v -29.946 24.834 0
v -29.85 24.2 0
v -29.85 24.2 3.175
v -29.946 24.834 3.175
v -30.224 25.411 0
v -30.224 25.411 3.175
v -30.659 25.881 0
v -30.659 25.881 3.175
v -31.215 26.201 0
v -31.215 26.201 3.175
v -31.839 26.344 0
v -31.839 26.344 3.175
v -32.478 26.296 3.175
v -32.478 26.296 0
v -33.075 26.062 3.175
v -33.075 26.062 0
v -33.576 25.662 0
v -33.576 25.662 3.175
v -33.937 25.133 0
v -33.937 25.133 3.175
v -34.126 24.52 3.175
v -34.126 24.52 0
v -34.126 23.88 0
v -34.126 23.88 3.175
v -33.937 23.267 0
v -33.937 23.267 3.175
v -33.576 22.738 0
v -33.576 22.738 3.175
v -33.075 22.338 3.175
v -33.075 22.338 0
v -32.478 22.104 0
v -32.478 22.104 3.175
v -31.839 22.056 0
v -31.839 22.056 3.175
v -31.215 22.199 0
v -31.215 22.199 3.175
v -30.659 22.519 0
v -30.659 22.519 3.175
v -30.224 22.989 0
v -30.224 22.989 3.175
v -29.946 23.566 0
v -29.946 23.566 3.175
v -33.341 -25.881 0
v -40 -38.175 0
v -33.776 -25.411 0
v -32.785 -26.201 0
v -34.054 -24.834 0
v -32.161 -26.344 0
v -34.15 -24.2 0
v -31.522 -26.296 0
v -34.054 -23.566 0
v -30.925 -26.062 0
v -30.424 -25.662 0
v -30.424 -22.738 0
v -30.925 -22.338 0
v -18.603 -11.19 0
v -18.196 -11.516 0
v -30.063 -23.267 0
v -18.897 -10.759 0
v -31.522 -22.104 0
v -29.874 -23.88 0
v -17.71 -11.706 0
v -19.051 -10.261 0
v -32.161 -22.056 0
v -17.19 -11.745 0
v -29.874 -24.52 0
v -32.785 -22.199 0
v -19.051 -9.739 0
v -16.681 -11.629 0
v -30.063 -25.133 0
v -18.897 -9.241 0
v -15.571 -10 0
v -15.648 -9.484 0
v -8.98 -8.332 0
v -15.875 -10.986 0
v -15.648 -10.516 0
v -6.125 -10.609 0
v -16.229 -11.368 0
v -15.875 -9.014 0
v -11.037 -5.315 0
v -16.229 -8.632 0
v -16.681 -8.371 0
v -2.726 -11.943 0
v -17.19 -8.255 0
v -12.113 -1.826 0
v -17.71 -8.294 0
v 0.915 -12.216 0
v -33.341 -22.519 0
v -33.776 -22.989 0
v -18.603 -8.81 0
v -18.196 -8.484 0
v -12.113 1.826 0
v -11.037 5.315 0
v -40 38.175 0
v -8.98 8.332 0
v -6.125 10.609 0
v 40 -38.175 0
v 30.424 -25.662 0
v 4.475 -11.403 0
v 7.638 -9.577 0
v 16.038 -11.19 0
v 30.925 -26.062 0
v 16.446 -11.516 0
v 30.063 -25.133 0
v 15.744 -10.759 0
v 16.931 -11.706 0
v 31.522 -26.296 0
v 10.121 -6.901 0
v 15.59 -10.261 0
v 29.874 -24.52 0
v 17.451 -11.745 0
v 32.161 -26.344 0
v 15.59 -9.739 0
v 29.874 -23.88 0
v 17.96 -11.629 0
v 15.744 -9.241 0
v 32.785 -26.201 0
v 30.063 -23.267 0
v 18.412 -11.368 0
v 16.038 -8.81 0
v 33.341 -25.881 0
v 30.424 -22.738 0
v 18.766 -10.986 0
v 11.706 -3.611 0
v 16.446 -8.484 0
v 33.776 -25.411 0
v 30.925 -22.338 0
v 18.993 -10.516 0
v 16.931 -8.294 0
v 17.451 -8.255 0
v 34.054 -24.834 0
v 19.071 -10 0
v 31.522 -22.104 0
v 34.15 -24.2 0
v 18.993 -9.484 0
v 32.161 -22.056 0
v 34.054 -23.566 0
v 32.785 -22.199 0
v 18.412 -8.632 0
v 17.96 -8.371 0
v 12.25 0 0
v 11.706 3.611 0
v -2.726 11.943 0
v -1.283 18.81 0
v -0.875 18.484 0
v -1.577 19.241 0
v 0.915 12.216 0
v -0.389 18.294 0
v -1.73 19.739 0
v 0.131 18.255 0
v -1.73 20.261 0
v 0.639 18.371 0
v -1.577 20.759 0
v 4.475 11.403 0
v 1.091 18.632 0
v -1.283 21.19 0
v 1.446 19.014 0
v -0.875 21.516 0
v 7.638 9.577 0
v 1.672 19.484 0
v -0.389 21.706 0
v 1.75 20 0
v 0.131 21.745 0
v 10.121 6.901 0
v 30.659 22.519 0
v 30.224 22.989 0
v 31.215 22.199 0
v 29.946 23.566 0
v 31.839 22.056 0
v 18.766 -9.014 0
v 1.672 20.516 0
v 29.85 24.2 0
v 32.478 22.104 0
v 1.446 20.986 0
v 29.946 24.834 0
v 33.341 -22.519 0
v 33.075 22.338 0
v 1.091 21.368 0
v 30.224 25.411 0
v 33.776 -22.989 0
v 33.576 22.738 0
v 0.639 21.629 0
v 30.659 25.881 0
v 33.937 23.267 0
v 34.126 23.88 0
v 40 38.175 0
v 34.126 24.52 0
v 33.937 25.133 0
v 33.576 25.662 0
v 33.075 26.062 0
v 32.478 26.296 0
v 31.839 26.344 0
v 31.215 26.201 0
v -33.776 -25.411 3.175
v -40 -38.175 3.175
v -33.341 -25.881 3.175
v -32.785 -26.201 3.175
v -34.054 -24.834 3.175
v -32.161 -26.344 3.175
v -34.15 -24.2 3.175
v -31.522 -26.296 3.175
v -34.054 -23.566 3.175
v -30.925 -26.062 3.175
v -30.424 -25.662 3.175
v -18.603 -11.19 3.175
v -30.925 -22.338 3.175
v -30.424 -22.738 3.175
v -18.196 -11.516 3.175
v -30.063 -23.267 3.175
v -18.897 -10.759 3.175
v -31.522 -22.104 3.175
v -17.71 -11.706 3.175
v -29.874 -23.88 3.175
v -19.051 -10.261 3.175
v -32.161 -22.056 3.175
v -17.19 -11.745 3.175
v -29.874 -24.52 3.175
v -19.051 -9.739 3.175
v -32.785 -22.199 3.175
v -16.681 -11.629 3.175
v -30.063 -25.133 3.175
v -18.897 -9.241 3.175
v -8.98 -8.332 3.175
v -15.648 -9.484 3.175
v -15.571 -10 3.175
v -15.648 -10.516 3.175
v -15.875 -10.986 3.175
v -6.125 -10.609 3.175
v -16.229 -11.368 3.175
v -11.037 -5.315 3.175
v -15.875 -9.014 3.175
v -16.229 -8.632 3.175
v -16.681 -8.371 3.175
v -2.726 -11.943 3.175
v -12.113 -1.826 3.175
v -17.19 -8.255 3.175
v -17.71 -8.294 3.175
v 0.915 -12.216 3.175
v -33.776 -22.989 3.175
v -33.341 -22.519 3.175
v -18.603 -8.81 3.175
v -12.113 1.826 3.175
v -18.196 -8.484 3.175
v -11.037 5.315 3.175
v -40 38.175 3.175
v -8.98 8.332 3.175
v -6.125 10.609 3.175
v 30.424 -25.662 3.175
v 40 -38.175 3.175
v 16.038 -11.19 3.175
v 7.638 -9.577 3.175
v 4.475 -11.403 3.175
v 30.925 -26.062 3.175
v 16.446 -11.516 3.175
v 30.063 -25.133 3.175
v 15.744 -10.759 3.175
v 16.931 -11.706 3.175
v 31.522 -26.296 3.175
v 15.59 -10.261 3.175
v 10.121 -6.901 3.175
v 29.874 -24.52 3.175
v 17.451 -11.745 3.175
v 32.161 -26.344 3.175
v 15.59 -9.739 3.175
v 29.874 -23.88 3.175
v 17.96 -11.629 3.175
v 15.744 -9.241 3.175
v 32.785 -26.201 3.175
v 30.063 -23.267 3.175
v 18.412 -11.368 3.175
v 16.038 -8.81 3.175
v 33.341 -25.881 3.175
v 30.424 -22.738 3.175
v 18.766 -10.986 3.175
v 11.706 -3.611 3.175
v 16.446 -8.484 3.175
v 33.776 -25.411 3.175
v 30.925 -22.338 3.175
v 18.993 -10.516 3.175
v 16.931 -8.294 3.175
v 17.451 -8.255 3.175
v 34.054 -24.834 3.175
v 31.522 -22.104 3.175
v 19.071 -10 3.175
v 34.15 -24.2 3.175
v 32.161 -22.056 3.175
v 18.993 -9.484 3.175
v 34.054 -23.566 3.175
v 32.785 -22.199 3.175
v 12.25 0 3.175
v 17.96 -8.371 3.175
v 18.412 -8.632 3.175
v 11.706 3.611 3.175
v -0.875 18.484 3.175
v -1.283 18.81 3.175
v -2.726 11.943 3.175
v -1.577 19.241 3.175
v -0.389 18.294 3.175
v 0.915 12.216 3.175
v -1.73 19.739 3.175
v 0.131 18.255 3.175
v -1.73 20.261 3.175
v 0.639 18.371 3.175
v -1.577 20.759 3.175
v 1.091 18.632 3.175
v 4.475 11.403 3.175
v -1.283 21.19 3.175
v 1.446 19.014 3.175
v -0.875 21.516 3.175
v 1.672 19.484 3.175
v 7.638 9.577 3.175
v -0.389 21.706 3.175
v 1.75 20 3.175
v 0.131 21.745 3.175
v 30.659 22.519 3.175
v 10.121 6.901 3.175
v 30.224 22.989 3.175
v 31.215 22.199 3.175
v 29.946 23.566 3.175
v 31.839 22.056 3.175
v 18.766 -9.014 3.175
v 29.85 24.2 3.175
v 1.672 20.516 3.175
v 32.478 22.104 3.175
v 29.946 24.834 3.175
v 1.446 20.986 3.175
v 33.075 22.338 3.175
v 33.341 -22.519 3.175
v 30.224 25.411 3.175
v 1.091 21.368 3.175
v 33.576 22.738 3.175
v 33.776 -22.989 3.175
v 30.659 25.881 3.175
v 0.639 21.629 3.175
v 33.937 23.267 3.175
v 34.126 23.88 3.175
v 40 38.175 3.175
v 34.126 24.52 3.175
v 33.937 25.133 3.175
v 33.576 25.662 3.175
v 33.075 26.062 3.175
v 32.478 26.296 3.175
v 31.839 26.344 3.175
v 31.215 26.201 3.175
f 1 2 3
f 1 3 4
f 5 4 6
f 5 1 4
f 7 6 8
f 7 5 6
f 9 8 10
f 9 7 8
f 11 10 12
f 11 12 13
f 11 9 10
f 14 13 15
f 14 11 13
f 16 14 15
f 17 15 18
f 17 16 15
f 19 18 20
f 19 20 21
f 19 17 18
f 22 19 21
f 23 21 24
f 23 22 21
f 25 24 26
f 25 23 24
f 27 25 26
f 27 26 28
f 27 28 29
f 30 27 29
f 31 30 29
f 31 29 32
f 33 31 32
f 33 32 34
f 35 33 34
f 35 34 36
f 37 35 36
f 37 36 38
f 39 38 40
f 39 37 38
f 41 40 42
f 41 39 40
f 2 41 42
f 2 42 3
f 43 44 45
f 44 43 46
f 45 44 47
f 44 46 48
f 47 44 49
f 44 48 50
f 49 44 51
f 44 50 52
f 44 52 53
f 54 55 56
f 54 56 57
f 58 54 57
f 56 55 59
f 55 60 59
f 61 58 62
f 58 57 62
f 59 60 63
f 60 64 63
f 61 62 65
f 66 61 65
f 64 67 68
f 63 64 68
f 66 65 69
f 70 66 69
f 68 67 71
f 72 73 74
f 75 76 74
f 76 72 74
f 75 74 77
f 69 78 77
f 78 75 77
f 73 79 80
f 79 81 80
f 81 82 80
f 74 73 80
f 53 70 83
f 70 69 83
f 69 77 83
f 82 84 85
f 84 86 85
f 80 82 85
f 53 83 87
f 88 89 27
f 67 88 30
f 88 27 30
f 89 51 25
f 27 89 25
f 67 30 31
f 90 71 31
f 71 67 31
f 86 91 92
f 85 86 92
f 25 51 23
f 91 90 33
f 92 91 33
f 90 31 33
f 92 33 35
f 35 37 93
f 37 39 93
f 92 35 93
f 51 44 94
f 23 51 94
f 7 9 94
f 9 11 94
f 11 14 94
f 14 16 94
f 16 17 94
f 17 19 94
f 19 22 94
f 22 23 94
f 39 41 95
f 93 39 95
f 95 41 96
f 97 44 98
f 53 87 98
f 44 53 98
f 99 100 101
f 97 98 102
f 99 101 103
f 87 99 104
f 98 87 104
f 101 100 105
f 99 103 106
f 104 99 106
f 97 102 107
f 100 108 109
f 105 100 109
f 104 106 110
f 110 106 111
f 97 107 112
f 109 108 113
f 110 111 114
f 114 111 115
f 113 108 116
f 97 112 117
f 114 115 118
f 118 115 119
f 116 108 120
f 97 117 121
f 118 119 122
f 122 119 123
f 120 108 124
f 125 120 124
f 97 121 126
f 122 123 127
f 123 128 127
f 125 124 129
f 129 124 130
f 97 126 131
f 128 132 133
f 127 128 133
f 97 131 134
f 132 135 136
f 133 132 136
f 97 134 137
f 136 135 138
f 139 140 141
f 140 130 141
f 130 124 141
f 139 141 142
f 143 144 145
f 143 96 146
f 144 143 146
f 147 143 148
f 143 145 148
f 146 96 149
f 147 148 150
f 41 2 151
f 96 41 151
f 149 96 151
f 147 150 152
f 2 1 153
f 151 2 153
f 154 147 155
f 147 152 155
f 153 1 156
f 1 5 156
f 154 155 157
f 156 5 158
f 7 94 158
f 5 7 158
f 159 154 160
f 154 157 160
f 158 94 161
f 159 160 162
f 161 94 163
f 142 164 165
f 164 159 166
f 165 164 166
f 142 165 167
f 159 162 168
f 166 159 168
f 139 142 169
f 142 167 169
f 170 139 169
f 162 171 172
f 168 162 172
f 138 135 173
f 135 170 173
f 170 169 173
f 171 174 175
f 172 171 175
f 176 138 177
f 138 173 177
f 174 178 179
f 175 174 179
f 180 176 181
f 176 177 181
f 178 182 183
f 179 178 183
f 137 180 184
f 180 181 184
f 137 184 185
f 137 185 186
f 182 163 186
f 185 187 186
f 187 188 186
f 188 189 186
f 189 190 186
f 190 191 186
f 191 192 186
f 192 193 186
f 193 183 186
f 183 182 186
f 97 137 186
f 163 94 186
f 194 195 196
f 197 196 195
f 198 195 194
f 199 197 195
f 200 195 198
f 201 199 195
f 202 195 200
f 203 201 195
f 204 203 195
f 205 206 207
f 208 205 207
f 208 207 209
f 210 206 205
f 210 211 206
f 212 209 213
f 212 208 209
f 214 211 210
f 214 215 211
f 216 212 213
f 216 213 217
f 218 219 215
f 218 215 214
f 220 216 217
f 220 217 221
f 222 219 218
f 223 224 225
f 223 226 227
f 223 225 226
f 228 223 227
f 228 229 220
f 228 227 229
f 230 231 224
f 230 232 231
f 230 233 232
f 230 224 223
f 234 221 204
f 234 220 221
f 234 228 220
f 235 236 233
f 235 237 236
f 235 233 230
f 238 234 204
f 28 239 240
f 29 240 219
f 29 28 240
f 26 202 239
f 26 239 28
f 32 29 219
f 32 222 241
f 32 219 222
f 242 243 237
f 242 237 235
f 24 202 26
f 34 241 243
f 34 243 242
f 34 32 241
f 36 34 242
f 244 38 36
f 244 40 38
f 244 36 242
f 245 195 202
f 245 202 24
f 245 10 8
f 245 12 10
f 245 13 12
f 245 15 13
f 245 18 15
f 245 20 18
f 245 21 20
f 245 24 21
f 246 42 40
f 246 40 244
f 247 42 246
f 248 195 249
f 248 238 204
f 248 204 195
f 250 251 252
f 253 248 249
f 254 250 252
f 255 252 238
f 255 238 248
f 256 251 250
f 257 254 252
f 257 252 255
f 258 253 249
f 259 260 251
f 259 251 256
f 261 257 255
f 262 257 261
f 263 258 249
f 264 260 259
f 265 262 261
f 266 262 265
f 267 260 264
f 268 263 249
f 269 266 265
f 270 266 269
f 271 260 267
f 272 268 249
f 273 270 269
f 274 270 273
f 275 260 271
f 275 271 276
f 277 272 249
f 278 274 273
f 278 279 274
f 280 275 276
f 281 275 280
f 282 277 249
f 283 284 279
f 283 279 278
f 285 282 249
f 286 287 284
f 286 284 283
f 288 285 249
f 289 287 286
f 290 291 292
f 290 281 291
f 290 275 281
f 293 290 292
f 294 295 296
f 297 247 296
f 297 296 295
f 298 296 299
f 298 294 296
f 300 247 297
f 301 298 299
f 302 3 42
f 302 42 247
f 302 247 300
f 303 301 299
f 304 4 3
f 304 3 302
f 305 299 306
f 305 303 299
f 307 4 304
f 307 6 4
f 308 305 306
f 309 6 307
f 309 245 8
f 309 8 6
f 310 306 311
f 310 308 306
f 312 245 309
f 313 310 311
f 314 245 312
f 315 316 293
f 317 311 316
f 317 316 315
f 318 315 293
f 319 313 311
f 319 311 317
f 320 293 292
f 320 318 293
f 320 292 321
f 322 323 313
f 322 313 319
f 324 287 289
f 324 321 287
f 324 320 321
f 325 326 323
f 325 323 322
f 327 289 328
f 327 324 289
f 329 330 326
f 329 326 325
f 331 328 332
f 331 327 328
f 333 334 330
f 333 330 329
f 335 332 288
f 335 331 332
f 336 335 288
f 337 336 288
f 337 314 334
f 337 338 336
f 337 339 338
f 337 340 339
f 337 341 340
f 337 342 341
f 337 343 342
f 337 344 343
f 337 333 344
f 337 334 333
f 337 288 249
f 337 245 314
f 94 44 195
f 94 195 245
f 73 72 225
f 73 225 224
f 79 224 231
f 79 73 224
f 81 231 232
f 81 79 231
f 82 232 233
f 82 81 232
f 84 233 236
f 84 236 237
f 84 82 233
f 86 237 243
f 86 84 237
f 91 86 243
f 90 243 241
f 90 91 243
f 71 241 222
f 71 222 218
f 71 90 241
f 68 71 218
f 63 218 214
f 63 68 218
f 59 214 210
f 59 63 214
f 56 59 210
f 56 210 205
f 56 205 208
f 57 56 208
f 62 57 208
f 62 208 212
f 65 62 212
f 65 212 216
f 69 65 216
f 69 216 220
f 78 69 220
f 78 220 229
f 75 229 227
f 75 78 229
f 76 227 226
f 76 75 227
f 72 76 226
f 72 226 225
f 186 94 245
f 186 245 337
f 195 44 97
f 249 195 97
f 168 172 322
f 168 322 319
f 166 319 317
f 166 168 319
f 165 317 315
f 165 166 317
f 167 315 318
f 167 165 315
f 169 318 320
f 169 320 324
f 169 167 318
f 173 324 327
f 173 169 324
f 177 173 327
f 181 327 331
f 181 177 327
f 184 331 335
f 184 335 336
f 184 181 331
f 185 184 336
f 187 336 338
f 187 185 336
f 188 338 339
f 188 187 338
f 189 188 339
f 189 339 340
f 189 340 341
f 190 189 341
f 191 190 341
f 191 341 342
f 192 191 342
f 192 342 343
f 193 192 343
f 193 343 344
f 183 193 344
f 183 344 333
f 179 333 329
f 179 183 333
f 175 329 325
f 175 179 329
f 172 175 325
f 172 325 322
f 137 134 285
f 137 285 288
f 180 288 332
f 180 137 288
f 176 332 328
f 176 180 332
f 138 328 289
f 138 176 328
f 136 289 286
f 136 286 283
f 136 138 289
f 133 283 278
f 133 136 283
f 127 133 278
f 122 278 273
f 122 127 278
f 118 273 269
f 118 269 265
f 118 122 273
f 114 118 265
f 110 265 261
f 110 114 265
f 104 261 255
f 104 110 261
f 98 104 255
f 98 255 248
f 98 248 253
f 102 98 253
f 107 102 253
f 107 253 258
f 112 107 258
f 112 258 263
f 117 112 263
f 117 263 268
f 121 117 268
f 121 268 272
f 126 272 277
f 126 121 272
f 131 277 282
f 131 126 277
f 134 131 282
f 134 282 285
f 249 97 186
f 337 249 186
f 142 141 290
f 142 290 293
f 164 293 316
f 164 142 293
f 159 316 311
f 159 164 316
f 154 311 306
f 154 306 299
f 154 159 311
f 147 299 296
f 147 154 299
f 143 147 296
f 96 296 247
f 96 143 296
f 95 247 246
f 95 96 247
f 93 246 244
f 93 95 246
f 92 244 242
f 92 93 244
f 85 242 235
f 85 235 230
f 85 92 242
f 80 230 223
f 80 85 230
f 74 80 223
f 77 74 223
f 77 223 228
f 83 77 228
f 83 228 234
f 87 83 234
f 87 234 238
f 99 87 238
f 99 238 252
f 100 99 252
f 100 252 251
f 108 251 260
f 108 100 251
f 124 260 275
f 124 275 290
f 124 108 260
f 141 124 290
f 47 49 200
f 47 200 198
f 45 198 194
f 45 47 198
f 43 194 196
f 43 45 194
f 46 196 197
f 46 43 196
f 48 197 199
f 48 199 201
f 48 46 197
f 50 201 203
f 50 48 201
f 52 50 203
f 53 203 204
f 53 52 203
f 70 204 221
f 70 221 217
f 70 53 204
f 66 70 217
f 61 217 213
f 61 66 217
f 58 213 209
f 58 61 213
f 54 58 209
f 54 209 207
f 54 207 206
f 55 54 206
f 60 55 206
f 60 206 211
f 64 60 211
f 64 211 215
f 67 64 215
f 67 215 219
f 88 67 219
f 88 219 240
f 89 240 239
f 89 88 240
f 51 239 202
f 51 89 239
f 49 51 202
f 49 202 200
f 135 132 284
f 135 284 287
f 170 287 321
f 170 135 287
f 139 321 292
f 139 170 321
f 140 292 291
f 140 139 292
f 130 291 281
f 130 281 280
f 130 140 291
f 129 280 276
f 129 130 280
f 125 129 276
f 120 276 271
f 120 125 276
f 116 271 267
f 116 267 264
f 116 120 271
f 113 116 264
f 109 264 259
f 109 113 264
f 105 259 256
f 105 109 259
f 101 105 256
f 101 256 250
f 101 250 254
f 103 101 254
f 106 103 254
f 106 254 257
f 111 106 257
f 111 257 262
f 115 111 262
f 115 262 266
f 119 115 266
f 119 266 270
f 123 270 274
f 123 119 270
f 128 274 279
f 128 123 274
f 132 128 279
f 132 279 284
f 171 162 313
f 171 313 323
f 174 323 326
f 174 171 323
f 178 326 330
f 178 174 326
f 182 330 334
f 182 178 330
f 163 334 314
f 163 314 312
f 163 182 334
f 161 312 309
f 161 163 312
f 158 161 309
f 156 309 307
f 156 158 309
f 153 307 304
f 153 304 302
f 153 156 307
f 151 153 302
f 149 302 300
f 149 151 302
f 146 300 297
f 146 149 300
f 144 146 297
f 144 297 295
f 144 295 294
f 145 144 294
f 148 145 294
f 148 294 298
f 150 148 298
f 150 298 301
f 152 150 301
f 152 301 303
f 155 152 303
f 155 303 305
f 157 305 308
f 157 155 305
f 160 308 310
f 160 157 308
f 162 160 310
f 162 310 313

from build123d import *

# Parameters (mm, degrees)
SKETCH1_W           = 80
SKETCH1_H           = 76.35
SKETCH1_R           = 1.75
SKETCH1_R_2         = 12.25
SKETCH1_R_3         = 2.15
BOSS_EXTRUDE1_DEPTH = 3.175


with BuildPart() as part:
    # Sketch1 → Boss-Extrude1 (new body)
    with BuildSketch(Plane.XY):
        Rectangle(SKETCH1_W, SKETCH1_H)
        with Locations((0, 20)):
            Circle(SKETCH1_R, mode=Mode.SUBTRACT)
        Circle(SKETCH1_R_2, mode=Mode.SUBTRACT)
        with Locations((17.320508076, -10)):
            Circle(SKETCH1_R, mode=Mode.SUBTRACT)
        with Locations((-17.320508076, -10)):
            Circle(SKETCH1_R, mode=Mode.SUBTRACT)
        with Locations((-32, 24.2)):
            Circle(SKETCH1_R_3, mode=Mode.SUBTRACT)
        with Locations(Location((32, 24.2, 0), (0, 0, 180))):
            Circle(SKETCH1_R_3, mode=Mode.SUBTRACT)
        with Locations((32, -24.2)):
            Circle(SKETCH1_R_3, mode=Mode.SUBTRACT)
        with Locations(Location((-32, -24.2, 0), (0, 0, 180))):
            Circle(SKETCH1_R_3, mode=Mode.SUBTRACT)
    extrude(amount=BOSS_EXTRUDE1_DEPTH)


solid = part.part
